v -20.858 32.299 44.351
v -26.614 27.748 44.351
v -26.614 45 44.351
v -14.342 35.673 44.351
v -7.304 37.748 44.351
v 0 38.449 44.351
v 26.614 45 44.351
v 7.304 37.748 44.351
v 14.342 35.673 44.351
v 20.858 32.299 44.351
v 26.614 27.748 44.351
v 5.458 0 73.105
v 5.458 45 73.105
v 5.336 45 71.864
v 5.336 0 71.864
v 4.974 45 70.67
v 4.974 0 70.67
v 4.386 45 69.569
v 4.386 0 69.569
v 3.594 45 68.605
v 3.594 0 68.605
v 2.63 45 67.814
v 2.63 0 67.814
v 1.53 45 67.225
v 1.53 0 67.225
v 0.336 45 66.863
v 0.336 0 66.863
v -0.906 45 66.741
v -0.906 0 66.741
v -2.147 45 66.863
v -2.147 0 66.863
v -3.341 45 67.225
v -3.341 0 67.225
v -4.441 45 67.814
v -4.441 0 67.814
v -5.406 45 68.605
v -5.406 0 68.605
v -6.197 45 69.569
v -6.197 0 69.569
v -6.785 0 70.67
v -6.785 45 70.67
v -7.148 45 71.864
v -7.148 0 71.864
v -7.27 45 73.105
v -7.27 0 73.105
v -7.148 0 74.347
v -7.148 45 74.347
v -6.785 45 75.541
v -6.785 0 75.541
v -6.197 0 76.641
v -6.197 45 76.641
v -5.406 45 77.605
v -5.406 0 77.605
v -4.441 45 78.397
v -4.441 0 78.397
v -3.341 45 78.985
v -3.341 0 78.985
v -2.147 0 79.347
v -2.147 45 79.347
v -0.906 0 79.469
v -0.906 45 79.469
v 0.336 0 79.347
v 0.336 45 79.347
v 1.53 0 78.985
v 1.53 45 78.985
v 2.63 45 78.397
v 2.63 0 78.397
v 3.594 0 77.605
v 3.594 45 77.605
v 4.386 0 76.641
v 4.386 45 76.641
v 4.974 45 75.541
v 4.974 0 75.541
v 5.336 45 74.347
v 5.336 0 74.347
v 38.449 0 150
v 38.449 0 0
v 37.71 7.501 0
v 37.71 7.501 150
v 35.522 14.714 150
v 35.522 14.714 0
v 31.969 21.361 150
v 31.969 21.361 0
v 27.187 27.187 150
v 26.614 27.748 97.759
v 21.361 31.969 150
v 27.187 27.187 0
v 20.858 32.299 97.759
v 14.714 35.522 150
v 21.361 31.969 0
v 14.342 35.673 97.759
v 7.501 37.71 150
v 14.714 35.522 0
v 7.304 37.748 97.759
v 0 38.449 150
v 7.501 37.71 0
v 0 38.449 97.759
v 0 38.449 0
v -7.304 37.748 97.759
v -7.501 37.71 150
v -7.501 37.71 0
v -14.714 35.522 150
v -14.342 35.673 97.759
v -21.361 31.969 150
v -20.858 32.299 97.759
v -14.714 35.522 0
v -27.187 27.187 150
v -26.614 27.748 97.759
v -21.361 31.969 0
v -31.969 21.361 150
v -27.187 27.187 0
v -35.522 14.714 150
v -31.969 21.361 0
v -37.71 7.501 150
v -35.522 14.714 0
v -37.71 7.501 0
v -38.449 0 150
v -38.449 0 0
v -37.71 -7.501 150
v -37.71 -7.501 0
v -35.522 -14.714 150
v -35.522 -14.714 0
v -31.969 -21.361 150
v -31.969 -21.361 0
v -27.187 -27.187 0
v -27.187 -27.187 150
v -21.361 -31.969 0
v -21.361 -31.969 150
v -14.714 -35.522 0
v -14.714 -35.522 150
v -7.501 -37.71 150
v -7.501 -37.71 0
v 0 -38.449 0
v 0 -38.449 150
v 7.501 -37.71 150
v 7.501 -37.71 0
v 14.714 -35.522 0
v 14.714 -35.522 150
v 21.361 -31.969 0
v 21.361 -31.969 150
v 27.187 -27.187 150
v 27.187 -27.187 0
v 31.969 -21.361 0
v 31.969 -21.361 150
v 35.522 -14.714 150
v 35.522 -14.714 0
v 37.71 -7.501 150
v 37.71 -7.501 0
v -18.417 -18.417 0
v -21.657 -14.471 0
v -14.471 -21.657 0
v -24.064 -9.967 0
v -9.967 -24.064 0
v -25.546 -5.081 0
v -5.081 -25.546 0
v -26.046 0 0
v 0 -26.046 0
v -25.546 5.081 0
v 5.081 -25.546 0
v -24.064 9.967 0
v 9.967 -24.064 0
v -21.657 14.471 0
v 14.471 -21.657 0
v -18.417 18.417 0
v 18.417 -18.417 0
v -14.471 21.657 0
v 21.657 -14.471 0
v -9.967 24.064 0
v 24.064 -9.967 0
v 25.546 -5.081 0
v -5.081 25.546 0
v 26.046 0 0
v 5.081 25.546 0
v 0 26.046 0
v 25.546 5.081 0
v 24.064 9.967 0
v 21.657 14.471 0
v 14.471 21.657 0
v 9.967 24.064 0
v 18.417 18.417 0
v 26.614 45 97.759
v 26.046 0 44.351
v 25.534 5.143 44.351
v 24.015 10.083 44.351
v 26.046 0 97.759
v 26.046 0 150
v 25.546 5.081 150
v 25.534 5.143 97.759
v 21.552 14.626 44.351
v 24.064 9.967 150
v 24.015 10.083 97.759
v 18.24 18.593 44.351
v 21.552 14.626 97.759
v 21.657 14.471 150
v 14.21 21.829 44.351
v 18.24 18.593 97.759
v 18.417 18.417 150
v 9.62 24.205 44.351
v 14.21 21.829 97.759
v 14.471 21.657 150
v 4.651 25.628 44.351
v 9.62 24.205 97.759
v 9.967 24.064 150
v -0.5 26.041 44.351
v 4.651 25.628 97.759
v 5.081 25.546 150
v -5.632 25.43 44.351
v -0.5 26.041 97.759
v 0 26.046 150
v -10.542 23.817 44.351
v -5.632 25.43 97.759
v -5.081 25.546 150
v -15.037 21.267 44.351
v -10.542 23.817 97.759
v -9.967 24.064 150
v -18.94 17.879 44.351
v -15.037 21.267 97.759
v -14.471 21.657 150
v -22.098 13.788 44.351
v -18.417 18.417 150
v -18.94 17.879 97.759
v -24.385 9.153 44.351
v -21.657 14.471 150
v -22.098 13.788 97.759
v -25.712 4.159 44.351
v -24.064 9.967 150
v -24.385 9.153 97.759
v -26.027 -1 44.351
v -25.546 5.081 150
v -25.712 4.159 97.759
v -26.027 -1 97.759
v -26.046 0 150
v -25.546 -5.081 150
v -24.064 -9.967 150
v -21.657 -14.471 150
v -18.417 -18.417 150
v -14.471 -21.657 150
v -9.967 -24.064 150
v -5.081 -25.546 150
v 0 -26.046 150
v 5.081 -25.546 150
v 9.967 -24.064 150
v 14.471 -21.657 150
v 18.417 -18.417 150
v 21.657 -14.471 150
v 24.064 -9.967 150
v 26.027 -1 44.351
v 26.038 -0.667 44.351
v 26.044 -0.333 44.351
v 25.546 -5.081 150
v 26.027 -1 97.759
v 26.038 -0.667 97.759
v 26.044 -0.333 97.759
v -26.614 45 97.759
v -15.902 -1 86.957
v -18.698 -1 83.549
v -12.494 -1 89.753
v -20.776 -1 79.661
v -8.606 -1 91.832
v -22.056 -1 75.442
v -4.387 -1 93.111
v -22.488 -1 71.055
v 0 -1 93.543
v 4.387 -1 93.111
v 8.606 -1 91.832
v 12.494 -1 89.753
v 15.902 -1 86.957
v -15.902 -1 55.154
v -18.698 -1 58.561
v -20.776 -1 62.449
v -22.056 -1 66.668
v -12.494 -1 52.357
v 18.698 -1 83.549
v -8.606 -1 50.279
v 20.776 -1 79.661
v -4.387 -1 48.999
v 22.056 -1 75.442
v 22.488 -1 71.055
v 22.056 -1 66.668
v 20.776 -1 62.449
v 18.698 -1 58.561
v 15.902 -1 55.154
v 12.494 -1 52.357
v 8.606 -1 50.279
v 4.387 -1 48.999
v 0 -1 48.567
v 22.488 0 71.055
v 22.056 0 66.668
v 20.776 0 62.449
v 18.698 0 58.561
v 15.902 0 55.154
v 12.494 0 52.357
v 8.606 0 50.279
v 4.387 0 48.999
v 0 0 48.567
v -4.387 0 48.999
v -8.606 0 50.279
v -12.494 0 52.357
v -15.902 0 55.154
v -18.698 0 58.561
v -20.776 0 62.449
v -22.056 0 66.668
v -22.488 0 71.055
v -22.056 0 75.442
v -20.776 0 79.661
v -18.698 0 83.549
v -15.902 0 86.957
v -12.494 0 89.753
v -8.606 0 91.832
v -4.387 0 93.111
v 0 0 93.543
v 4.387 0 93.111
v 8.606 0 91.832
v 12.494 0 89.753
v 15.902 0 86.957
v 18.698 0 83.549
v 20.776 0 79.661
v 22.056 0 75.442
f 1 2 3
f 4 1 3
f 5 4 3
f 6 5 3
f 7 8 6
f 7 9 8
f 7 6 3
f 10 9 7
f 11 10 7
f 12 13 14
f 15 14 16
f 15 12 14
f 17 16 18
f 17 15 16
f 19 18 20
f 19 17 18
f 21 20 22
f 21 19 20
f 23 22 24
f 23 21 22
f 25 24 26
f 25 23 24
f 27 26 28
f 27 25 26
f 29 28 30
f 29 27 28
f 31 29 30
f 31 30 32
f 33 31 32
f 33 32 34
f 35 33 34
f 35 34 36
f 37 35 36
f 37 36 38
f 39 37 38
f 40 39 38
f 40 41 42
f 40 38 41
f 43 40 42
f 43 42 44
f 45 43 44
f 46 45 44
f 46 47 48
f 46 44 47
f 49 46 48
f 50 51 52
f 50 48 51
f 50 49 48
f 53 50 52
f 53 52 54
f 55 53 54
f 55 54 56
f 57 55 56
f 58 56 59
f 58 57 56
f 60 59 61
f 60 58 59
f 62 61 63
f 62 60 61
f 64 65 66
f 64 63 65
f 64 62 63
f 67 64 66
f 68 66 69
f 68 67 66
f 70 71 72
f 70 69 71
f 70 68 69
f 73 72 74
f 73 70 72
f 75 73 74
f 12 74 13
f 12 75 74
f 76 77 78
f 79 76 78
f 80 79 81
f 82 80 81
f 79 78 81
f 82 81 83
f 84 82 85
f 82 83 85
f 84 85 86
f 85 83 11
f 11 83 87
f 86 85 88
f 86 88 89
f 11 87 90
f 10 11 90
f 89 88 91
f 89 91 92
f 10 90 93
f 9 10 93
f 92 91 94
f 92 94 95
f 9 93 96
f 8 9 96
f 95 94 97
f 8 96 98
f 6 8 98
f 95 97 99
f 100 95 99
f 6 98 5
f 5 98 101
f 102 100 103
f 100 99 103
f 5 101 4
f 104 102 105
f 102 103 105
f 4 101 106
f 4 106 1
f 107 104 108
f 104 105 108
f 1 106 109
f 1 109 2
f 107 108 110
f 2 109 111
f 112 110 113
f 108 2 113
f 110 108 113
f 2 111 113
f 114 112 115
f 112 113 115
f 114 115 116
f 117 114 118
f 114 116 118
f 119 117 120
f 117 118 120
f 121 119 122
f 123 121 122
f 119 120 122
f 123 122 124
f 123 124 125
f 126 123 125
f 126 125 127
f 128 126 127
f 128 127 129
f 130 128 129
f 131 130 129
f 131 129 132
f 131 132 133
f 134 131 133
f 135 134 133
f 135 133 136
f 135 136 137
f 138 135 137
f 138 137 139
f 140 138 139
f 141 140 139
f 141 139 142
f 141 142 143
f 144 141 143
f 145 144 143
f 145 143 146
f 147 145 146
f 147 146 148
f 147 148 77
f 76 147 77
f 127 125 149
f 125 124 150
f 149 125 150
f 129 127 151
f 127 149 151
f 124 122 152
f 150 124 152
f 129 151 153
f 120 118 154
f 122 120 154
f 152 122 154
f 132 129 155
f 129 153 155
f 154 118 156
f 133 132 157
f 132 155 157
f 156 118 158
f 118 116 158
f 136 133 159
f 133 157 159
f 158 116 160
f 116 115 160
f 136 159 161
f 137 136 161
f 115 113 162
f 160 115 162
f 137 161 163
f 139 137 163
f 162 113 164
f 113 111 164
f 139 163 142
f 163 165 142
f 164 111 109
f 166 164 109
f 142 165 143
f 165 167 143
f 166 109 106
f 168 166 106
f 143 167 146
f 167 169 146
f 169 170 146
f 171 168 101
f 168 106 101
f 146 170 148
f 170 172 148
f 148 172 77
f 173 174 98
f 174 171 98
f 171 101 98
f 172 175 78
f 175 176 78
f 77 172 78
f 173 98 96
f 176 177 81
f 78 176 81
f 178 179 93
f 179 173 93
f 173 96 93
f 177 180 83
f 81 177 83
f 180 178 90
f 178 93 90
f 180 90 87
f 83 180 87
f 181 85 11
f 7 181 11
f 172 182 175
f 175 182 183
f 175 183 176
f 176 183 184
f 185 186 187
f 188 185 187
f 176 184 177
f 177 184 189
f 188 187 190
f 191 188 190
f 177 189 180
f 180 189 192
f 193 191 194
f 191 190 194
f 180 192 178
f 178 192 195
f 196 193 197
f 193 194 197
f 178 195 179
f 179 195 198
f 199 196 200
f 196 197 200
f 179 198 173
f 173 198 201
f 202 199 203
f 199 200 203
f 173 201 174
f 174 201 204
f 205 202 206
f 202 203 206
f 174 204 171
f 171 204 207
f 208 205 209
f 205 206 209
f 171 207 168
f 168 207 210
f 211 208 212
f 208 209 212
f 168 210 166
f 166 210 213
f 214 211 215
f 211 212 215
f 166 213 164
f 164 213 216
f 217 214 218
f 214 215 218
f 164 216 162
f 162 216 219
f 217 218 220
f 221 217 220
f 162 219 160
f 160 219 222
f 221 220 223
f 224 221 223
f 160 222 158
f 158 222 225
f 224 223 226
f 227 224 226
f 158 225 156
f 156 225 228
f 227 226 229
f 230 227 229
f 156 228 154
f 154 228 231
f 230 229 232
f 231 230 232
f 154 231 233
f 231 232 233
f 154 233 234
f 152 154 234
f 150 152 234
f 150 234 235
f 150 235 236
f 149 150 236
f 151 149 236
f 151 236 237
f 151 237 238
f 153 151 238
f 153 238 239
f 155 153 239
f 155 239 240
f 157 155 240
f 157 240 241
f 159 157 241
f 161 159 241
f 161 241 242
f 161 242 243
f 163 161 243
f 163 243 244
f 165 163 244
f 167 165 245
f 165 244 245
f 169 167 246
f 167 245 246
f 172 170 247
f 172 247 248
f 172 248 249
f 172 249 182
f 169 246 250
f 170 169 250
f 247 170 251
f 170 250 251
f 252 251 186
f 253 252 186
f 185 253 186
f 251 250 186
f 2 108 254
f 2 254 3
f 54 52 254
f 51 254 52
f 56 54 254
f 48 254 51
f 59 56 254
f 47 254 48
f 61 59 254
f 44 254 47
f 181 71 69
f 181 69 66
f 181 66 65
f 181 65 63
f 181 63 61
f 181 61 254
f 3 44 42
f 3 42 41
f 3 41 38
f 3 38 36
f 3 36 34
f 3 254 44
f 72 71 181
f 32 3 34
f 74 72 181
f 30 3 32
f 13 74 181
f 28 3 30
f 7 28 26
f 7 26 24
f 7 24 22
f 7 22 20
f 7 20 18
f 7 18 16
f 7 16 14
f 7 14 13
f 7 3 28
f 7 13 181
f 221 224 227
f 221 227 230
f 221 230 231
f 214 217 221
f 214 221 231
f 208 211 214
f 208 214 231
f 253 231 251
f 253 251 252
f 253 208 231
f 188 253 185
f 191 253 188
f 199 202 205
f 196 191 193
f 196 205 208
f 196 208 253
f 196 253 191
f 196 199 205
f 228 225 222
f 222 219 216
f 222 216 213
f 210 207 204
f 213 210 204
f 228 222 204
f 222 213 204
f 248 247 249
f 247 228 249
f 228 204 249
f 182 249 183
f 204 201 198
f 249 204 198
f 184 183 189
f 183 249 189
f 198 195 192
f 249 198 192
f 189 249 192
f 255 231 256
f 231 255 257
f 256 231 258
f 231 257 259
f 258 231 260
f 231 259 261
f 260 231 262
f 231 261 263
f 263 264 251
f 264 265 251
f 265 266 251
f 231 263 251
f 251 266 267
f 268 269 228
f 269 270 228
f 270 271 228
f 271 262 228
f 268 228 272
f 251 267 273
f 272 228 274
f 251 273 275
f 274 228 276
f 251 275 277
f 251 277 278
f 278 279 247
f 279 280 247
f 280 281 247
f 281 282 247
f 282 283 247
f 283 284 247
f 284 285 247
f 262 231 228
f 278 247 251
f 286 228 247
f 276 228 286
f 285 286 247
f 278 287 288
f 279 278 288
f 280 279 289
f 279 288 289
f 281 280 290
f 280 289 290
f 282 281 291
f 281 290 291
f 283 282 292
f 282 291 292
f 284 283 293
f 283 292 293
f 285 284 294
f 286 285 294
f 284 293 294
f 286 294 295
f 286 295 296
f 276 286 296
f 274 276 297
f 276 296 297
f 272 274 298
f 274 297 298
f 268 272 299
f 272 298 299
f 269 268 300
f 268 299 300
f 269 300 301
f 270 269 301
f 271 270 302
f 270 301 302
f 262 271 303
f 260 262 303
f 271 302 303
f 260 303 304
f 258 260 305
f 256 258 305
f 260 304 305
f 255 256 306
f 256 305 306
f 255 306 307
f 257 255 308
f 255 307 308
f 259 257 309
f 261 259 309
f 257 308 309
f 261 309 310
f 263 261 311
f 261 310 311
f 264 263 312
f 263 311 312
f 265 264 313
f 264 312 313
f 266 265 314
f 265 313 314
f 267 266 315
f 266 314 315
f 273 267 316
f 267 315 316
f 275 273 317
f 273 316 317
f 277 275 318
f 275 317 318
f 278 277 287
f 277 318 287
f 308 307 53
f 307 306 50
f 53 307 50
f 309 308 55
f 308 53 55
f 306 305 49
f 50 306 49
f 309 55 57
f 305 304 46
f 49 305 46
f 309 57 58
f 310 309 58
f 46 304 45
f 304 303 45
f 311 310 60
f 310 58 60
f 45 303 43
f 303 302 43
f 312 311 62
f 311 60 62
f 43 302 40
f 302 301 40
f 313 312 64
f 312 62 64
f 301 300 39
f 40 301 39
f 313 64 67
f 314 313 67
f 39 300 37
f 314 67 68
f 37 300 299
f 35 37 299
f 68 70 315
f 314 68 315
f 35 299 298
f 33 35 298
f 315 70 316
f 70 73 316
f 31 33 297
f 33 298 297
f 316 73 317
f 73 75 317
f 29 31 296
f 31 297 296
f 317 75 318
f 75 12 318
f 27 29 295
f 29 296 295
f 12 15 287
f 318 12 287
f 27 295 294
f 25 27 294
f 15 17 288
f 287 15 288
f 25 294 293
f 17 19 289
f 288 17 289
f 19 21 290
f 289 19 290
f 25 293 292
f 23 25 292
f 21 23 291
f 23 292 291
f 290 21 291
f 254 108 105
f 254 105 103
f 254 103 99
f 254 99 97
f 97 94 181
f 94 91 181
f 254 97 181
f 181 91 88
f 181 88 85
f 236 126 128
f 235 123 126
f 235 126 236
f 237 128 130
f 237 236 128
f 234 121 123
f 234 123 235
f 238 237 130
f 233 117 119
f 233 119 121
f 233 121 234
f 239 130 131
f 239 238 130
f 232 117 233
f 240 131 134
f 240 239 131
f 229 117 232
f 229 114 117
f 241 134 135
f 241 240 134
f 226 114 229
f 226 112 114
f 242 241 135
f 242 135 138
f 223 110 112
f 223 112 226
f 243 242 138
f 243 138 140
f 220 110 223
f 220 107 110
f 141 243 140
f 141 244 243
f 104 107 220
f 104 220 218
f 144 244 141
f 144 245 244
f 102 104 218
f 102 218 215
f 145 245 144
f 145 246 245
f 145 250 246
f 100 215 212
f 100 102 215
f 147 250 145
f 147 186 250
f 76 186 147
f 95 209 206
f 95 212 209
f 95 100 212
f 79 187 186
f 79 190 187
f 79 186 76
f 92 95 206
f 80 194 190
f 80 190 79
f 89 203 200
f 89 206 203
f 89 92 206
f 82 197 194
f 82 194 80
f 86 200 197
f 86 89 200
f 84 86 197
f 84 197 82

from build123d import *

# Parameters (mm, degrees)
SKETCH16_R               = 38.448520448
BOSS_EXTRUDE3_DEPTH      = 150
SKETCH17_R               = 26.04625397
CUT_EXTRUDE2_DEPTH       = 1
CUT_EXTRUDE2_DEPTH_BACK  = 151
SKETCH18_R               = 18.685585603
CUT_EXTRUDE3_DEPTH       = 39.448520448
CUT_EXTRUDE3_DEPTH_BACK  = 1
SKETCH19_W               = 53.228745634
SKETCH19_H               = 53.407658992
BOSS_EXTRUDE4_DEPTH      = 45
BOSS_EXTRUDE4_DEPTH_BACK = 1
SKETCH20_R               = 22.488274744
CUT_EXTRUDE4_DEPTH       = 46
CUT_EXTRUDE4_DEPTH_BACK  = 1
SKETCH21_W               = 53.228745634
SKETCH21_H               = 53.043515862
BOSS_EXTRUDE5_DEPTH      = 45
SKETCH22_R               = 6.364118175
CUT_EXTRUDE5_DEPTH       = 55
CUT_EXTRUDE5_DEPTH_BACK  = 1


with BuildPart() as part:
    # Sketch16 → Boss-Extrude3 (new body)
    with BuildSketch(Plane.XY):
        Circle(SKETCH16_R)
    extrude(amount=BOSS_EXTRUDE3_DEPTH)

    # Sketch17 → Cut-Extrude2 (cut, two sides)
    with BuildSketch(Plane.XY.offset(150)) as cut_extrude2_sk:
        Circle(SKETCH17_R)
    extrude(amount=CUT_EXTRUDE2_DEPTH, mode=Mode.SUBTRACT)
    extrude(cut_extrude2_sk.sketch, amount=-CUT_EXTRUDE2_DEPTH_BACK, mode=Mode.SUBTRACT)

    # Sketch18 → Cut-Extrude3 (cut, two sides)
    with BuildSketch(Plane(origin=(0, 0, 0), x_dir=(1, 0, 0), z_dir=(0, 1, 0))) as cut_extrude3_sk:
        with Locations((0, -71.055116097)):
            Circle(SKETCH18_R)
    extrude(amount=CUT_EXTRUDE3_DEPTH, mode=Mode.SUBTRACT)
    extrude(cut_extrude3_sk.sketch, amount=-CUT_EXTRUDE3_DEPTH_BACK, mode=Mode.SUBTRACT)

    # Sketch19 → Boss-Extrude4 (add, two sides)
    with BuildSketch(Plane(origin=(0, 0, 0), x_dir=(1, 0, 0), z_dir=(0, 1, 0))) as boss_extrude4_sk:
        with Locations((0, -71.055116097)):
            Rectangle(SKETCH19_W, SKETCH19_H)
    extrude(amount=BOSS_EXTRUDE4_DEPTH)
    extrude(boss_extrude4_sk.sketch, amount=-BOSS_EXTRUDE4_DEPTH_BACK)

    # Sketch20 → Cut-Extrude4 (cut, two sides)
    with BuildSketch(Plane(origin=(0, 0, 0), x_dir=(1, 0, 0), z_dir=(0, 1, 0))) as cut_extrude4_sk:
        with Locations((0, -71.055116097)):
            Circle(SKETCH20_R)
    extrude(amount=CUT_EXTRUDE4_DEPTH, mode=Mode.SUBTRACT)
    extrude(cut_extrude4_sk.sketch, amount=-CUT_EXTRUDE4_DEPTH_BACK, mode=Mode.SUBTRACT)

    # Sketch21 → Boss-Extrude5 (add)
    with BuildSketch(Plane(origin=(0, 0, 0), x_dir=(1, 0, 0), z_dir=(0, 1, 0))):
        with Locations((0, -71.237187662)):
            Rectangle(SKETCH21_W, SKETCH21_H)
    extrude(amount=BOSS_EXTRUDE5_DEPTH)

    # Sketch22 → Cut-Extrude5 (cut, two sides)
    with BuildSketch(Plane(origin=(0, 0, 0), x_dir=(1, 0, 0), z_dir=(0, 1, 0))) as cut_extrude5_sk:
        with Locations((-0.905733708, -73.105080143)):
            Circle(SKETCH22_R)
    extrude(amount=CUT_EXTRUDE5_DEPTH, mode=Mode.SUBTRACT)
    extrude(cut_extrude5_sk.sketch, amount=-CUT_EXTRUDE5_DEPTH_BACK, mode=Mode.SUBTRACT)


solid = part.part
